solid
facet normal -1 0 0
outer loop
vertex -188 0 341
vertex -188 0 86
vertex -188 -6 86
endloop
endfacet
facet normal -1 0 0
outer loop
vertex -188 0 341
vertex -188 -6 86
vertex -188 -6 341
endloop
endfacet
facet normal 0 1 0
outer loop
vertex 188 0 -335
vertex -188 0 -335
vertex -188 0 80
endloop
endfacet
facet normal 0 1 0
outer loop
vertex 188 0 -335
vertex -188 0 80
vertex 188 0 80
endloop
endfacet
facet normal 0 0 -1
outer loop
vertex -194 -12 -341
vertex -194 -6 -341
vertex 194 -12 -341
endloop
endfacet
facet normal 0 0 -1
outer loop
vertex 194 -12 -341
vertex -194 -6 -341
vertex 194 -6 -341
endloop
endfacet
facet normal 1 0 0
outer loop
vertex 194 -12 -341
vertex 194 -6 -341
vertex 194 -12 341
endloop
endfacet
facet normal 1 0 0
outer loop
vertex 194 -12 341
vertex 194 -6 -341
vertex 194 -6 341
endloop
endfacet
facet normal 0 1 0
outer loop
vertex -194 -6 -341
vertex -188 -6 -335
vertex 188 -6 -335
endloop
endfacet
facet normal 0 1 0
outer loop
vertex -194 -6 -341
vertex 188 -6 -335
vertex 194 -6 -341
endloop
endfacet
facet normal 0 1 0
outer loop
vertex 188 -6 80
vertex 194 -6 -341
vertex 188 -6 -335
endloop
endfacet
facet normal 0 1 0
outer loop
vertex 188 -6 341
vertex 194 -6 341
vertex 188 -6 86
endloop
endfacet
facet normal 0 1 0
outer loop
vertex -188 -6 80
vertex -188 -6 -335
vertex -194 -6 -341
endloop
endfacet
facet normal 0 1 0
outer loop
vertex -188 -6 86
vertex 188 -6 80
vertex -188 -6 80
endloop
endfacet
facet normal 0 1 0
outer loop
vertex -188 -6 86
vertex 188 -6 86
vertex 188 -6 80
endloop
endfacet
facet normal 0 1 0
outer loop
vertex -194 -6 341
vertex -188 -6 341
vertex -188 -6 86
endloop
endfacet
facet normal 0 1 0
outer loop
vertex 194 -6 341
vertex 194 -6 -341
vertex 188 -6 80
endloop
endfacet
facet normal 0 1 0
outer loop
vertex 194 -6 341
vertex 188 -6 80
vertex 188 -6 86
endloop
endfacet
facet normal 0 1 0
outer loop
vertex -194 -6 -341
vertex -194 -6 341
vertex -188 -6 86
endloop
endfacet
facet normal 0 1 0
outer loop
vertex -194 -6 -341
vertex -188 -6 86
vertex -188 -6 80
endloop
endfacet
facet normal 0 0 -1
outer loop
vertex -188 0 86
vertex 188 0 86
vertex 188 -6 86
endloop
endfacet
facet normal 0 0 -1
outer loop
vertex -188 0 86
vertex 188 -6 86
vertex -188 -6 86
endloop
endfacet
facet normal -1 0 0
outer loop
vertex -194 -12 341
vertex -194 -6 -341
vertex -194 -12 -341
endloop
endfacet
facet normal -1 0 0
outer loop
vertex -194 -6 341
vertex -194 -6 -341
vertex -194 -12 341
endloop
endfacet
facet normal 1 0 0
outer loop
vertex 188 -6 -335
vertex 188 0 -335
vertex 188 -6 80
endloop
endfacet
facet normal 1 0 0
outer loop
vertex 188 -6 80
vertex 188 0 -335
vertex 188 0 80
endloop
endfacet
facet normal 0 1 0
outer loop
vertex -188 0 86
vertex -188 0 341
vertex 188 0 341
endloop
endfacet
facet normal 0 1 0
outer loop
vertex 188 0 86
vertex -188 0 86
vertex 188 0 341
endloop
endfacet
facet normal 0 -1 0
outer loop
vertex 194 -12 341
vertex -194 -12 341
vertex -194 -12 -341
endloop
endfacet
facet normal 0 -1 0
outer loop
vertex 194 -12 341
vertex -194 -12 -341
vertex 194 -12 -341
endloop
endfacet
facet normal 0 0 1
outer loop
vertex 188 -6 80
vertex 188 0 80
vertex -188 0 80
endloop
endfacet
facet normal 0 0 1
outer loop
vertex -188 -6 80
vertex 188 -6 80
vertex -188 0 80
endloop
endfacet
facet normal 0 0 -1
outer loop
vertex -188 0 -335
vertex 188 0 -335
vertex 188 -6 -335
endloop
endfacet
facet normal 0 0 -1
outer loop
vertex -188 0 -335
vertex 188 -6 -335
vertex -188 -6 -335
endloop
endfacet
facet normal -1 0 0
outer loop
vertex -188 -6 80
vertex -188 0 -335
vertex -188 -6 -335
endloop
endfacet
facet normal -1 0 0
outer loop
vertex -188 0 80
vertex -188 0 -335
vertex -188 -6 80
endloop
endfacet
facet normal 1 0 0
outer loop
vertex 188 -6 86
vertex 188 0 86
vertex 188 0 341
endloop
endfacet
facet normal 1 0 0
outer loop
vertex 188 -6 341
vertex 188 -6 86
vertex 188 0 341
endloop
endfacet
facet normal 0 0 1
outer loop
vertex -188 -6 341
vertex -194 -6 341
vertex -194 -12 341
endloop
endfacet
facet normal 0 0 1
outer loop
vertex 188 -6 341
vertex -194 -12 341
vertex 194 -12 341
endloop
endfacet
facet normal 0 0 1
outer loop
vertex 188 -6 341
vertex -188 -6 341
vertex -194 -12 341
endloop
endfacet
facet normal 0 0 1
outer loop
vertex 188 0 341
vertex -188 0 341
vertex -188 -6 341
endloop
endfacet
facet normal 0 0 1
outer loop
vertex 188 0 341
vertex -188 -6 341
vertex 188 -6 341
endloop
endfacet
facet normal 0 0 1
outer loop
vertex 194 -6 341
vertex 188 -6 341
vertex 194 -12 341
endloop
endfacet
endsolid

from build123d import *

# Parameters (mm, degrees)
F0_W     = 388
F0_H     = 682
F1_DEPTH = 12
F2_W     = 6
F2_H     = 682
F3_DEPTH = 6
F4_W     = 382
F4_H     = 6
F5_DEPTH = 6
F6_W     = 6
F6_H     = 676
F7_DEPTH = 6
F8_W     = 376
F8_H     = 6
F9_DEPTH = 6


with BuildPart() as f1:
    # F0 (on Front) → F1 (new body)
    with BuildSketch(Plane.XZ):
        Rectangle(F0_W, F0_H)
    extrude(amount=F1_DEPTH)

    # F2 (on face) → F3 (cut)
    with BuildSketch(Plane(origin=(0, 0, 0), x_dir=(-1, 0, 0), z_dir=(0, 1, 0))):
        with Locations((191, 0)):
            Rectangle(F2_W, F2_H)
    extrude(amount=-F3_DEPTH, mode=Mode.SUBTRACT)

    # F4 (on face) → F5 (cut)
    with BuildSketch(Plane(origin=(0, 0, 0), x_dir=(-1, 0, 0), z_dir=(0, 1, 0))):
        with Locations((-3, -338)):
            Rectangle(F4_W, F4_H)
    extrude(amount=-F5_DEPTH, mode=Mode.SUBTRACT)

    # F6 (on face) → F7 (cut)
    with BuildSketch(Plane(origin=(0, 0, 0), x_dir=(-1, 0, 0), z_dir=(0, 1, 0))):
        with Locations((-191, 3)):
            Rectangle(F6_W, F6_H)
    extrude(amount=-F7_DEPTH, mode=Mode.SUBTRACT)

    # F8 (on face) → F9 (cut)
    with BuildSketch(Plane(origin=(0, 0, 0), x_dir=(-1, 0, 0), z_dir=(0, 1, 0))):
        with Locations((0, 83)):
            Rectangle(F8_W, F8_H)
    extrude(amount=-F9_DEPTH, mode=Mode.SUBTRACT)


solid = f1.part
